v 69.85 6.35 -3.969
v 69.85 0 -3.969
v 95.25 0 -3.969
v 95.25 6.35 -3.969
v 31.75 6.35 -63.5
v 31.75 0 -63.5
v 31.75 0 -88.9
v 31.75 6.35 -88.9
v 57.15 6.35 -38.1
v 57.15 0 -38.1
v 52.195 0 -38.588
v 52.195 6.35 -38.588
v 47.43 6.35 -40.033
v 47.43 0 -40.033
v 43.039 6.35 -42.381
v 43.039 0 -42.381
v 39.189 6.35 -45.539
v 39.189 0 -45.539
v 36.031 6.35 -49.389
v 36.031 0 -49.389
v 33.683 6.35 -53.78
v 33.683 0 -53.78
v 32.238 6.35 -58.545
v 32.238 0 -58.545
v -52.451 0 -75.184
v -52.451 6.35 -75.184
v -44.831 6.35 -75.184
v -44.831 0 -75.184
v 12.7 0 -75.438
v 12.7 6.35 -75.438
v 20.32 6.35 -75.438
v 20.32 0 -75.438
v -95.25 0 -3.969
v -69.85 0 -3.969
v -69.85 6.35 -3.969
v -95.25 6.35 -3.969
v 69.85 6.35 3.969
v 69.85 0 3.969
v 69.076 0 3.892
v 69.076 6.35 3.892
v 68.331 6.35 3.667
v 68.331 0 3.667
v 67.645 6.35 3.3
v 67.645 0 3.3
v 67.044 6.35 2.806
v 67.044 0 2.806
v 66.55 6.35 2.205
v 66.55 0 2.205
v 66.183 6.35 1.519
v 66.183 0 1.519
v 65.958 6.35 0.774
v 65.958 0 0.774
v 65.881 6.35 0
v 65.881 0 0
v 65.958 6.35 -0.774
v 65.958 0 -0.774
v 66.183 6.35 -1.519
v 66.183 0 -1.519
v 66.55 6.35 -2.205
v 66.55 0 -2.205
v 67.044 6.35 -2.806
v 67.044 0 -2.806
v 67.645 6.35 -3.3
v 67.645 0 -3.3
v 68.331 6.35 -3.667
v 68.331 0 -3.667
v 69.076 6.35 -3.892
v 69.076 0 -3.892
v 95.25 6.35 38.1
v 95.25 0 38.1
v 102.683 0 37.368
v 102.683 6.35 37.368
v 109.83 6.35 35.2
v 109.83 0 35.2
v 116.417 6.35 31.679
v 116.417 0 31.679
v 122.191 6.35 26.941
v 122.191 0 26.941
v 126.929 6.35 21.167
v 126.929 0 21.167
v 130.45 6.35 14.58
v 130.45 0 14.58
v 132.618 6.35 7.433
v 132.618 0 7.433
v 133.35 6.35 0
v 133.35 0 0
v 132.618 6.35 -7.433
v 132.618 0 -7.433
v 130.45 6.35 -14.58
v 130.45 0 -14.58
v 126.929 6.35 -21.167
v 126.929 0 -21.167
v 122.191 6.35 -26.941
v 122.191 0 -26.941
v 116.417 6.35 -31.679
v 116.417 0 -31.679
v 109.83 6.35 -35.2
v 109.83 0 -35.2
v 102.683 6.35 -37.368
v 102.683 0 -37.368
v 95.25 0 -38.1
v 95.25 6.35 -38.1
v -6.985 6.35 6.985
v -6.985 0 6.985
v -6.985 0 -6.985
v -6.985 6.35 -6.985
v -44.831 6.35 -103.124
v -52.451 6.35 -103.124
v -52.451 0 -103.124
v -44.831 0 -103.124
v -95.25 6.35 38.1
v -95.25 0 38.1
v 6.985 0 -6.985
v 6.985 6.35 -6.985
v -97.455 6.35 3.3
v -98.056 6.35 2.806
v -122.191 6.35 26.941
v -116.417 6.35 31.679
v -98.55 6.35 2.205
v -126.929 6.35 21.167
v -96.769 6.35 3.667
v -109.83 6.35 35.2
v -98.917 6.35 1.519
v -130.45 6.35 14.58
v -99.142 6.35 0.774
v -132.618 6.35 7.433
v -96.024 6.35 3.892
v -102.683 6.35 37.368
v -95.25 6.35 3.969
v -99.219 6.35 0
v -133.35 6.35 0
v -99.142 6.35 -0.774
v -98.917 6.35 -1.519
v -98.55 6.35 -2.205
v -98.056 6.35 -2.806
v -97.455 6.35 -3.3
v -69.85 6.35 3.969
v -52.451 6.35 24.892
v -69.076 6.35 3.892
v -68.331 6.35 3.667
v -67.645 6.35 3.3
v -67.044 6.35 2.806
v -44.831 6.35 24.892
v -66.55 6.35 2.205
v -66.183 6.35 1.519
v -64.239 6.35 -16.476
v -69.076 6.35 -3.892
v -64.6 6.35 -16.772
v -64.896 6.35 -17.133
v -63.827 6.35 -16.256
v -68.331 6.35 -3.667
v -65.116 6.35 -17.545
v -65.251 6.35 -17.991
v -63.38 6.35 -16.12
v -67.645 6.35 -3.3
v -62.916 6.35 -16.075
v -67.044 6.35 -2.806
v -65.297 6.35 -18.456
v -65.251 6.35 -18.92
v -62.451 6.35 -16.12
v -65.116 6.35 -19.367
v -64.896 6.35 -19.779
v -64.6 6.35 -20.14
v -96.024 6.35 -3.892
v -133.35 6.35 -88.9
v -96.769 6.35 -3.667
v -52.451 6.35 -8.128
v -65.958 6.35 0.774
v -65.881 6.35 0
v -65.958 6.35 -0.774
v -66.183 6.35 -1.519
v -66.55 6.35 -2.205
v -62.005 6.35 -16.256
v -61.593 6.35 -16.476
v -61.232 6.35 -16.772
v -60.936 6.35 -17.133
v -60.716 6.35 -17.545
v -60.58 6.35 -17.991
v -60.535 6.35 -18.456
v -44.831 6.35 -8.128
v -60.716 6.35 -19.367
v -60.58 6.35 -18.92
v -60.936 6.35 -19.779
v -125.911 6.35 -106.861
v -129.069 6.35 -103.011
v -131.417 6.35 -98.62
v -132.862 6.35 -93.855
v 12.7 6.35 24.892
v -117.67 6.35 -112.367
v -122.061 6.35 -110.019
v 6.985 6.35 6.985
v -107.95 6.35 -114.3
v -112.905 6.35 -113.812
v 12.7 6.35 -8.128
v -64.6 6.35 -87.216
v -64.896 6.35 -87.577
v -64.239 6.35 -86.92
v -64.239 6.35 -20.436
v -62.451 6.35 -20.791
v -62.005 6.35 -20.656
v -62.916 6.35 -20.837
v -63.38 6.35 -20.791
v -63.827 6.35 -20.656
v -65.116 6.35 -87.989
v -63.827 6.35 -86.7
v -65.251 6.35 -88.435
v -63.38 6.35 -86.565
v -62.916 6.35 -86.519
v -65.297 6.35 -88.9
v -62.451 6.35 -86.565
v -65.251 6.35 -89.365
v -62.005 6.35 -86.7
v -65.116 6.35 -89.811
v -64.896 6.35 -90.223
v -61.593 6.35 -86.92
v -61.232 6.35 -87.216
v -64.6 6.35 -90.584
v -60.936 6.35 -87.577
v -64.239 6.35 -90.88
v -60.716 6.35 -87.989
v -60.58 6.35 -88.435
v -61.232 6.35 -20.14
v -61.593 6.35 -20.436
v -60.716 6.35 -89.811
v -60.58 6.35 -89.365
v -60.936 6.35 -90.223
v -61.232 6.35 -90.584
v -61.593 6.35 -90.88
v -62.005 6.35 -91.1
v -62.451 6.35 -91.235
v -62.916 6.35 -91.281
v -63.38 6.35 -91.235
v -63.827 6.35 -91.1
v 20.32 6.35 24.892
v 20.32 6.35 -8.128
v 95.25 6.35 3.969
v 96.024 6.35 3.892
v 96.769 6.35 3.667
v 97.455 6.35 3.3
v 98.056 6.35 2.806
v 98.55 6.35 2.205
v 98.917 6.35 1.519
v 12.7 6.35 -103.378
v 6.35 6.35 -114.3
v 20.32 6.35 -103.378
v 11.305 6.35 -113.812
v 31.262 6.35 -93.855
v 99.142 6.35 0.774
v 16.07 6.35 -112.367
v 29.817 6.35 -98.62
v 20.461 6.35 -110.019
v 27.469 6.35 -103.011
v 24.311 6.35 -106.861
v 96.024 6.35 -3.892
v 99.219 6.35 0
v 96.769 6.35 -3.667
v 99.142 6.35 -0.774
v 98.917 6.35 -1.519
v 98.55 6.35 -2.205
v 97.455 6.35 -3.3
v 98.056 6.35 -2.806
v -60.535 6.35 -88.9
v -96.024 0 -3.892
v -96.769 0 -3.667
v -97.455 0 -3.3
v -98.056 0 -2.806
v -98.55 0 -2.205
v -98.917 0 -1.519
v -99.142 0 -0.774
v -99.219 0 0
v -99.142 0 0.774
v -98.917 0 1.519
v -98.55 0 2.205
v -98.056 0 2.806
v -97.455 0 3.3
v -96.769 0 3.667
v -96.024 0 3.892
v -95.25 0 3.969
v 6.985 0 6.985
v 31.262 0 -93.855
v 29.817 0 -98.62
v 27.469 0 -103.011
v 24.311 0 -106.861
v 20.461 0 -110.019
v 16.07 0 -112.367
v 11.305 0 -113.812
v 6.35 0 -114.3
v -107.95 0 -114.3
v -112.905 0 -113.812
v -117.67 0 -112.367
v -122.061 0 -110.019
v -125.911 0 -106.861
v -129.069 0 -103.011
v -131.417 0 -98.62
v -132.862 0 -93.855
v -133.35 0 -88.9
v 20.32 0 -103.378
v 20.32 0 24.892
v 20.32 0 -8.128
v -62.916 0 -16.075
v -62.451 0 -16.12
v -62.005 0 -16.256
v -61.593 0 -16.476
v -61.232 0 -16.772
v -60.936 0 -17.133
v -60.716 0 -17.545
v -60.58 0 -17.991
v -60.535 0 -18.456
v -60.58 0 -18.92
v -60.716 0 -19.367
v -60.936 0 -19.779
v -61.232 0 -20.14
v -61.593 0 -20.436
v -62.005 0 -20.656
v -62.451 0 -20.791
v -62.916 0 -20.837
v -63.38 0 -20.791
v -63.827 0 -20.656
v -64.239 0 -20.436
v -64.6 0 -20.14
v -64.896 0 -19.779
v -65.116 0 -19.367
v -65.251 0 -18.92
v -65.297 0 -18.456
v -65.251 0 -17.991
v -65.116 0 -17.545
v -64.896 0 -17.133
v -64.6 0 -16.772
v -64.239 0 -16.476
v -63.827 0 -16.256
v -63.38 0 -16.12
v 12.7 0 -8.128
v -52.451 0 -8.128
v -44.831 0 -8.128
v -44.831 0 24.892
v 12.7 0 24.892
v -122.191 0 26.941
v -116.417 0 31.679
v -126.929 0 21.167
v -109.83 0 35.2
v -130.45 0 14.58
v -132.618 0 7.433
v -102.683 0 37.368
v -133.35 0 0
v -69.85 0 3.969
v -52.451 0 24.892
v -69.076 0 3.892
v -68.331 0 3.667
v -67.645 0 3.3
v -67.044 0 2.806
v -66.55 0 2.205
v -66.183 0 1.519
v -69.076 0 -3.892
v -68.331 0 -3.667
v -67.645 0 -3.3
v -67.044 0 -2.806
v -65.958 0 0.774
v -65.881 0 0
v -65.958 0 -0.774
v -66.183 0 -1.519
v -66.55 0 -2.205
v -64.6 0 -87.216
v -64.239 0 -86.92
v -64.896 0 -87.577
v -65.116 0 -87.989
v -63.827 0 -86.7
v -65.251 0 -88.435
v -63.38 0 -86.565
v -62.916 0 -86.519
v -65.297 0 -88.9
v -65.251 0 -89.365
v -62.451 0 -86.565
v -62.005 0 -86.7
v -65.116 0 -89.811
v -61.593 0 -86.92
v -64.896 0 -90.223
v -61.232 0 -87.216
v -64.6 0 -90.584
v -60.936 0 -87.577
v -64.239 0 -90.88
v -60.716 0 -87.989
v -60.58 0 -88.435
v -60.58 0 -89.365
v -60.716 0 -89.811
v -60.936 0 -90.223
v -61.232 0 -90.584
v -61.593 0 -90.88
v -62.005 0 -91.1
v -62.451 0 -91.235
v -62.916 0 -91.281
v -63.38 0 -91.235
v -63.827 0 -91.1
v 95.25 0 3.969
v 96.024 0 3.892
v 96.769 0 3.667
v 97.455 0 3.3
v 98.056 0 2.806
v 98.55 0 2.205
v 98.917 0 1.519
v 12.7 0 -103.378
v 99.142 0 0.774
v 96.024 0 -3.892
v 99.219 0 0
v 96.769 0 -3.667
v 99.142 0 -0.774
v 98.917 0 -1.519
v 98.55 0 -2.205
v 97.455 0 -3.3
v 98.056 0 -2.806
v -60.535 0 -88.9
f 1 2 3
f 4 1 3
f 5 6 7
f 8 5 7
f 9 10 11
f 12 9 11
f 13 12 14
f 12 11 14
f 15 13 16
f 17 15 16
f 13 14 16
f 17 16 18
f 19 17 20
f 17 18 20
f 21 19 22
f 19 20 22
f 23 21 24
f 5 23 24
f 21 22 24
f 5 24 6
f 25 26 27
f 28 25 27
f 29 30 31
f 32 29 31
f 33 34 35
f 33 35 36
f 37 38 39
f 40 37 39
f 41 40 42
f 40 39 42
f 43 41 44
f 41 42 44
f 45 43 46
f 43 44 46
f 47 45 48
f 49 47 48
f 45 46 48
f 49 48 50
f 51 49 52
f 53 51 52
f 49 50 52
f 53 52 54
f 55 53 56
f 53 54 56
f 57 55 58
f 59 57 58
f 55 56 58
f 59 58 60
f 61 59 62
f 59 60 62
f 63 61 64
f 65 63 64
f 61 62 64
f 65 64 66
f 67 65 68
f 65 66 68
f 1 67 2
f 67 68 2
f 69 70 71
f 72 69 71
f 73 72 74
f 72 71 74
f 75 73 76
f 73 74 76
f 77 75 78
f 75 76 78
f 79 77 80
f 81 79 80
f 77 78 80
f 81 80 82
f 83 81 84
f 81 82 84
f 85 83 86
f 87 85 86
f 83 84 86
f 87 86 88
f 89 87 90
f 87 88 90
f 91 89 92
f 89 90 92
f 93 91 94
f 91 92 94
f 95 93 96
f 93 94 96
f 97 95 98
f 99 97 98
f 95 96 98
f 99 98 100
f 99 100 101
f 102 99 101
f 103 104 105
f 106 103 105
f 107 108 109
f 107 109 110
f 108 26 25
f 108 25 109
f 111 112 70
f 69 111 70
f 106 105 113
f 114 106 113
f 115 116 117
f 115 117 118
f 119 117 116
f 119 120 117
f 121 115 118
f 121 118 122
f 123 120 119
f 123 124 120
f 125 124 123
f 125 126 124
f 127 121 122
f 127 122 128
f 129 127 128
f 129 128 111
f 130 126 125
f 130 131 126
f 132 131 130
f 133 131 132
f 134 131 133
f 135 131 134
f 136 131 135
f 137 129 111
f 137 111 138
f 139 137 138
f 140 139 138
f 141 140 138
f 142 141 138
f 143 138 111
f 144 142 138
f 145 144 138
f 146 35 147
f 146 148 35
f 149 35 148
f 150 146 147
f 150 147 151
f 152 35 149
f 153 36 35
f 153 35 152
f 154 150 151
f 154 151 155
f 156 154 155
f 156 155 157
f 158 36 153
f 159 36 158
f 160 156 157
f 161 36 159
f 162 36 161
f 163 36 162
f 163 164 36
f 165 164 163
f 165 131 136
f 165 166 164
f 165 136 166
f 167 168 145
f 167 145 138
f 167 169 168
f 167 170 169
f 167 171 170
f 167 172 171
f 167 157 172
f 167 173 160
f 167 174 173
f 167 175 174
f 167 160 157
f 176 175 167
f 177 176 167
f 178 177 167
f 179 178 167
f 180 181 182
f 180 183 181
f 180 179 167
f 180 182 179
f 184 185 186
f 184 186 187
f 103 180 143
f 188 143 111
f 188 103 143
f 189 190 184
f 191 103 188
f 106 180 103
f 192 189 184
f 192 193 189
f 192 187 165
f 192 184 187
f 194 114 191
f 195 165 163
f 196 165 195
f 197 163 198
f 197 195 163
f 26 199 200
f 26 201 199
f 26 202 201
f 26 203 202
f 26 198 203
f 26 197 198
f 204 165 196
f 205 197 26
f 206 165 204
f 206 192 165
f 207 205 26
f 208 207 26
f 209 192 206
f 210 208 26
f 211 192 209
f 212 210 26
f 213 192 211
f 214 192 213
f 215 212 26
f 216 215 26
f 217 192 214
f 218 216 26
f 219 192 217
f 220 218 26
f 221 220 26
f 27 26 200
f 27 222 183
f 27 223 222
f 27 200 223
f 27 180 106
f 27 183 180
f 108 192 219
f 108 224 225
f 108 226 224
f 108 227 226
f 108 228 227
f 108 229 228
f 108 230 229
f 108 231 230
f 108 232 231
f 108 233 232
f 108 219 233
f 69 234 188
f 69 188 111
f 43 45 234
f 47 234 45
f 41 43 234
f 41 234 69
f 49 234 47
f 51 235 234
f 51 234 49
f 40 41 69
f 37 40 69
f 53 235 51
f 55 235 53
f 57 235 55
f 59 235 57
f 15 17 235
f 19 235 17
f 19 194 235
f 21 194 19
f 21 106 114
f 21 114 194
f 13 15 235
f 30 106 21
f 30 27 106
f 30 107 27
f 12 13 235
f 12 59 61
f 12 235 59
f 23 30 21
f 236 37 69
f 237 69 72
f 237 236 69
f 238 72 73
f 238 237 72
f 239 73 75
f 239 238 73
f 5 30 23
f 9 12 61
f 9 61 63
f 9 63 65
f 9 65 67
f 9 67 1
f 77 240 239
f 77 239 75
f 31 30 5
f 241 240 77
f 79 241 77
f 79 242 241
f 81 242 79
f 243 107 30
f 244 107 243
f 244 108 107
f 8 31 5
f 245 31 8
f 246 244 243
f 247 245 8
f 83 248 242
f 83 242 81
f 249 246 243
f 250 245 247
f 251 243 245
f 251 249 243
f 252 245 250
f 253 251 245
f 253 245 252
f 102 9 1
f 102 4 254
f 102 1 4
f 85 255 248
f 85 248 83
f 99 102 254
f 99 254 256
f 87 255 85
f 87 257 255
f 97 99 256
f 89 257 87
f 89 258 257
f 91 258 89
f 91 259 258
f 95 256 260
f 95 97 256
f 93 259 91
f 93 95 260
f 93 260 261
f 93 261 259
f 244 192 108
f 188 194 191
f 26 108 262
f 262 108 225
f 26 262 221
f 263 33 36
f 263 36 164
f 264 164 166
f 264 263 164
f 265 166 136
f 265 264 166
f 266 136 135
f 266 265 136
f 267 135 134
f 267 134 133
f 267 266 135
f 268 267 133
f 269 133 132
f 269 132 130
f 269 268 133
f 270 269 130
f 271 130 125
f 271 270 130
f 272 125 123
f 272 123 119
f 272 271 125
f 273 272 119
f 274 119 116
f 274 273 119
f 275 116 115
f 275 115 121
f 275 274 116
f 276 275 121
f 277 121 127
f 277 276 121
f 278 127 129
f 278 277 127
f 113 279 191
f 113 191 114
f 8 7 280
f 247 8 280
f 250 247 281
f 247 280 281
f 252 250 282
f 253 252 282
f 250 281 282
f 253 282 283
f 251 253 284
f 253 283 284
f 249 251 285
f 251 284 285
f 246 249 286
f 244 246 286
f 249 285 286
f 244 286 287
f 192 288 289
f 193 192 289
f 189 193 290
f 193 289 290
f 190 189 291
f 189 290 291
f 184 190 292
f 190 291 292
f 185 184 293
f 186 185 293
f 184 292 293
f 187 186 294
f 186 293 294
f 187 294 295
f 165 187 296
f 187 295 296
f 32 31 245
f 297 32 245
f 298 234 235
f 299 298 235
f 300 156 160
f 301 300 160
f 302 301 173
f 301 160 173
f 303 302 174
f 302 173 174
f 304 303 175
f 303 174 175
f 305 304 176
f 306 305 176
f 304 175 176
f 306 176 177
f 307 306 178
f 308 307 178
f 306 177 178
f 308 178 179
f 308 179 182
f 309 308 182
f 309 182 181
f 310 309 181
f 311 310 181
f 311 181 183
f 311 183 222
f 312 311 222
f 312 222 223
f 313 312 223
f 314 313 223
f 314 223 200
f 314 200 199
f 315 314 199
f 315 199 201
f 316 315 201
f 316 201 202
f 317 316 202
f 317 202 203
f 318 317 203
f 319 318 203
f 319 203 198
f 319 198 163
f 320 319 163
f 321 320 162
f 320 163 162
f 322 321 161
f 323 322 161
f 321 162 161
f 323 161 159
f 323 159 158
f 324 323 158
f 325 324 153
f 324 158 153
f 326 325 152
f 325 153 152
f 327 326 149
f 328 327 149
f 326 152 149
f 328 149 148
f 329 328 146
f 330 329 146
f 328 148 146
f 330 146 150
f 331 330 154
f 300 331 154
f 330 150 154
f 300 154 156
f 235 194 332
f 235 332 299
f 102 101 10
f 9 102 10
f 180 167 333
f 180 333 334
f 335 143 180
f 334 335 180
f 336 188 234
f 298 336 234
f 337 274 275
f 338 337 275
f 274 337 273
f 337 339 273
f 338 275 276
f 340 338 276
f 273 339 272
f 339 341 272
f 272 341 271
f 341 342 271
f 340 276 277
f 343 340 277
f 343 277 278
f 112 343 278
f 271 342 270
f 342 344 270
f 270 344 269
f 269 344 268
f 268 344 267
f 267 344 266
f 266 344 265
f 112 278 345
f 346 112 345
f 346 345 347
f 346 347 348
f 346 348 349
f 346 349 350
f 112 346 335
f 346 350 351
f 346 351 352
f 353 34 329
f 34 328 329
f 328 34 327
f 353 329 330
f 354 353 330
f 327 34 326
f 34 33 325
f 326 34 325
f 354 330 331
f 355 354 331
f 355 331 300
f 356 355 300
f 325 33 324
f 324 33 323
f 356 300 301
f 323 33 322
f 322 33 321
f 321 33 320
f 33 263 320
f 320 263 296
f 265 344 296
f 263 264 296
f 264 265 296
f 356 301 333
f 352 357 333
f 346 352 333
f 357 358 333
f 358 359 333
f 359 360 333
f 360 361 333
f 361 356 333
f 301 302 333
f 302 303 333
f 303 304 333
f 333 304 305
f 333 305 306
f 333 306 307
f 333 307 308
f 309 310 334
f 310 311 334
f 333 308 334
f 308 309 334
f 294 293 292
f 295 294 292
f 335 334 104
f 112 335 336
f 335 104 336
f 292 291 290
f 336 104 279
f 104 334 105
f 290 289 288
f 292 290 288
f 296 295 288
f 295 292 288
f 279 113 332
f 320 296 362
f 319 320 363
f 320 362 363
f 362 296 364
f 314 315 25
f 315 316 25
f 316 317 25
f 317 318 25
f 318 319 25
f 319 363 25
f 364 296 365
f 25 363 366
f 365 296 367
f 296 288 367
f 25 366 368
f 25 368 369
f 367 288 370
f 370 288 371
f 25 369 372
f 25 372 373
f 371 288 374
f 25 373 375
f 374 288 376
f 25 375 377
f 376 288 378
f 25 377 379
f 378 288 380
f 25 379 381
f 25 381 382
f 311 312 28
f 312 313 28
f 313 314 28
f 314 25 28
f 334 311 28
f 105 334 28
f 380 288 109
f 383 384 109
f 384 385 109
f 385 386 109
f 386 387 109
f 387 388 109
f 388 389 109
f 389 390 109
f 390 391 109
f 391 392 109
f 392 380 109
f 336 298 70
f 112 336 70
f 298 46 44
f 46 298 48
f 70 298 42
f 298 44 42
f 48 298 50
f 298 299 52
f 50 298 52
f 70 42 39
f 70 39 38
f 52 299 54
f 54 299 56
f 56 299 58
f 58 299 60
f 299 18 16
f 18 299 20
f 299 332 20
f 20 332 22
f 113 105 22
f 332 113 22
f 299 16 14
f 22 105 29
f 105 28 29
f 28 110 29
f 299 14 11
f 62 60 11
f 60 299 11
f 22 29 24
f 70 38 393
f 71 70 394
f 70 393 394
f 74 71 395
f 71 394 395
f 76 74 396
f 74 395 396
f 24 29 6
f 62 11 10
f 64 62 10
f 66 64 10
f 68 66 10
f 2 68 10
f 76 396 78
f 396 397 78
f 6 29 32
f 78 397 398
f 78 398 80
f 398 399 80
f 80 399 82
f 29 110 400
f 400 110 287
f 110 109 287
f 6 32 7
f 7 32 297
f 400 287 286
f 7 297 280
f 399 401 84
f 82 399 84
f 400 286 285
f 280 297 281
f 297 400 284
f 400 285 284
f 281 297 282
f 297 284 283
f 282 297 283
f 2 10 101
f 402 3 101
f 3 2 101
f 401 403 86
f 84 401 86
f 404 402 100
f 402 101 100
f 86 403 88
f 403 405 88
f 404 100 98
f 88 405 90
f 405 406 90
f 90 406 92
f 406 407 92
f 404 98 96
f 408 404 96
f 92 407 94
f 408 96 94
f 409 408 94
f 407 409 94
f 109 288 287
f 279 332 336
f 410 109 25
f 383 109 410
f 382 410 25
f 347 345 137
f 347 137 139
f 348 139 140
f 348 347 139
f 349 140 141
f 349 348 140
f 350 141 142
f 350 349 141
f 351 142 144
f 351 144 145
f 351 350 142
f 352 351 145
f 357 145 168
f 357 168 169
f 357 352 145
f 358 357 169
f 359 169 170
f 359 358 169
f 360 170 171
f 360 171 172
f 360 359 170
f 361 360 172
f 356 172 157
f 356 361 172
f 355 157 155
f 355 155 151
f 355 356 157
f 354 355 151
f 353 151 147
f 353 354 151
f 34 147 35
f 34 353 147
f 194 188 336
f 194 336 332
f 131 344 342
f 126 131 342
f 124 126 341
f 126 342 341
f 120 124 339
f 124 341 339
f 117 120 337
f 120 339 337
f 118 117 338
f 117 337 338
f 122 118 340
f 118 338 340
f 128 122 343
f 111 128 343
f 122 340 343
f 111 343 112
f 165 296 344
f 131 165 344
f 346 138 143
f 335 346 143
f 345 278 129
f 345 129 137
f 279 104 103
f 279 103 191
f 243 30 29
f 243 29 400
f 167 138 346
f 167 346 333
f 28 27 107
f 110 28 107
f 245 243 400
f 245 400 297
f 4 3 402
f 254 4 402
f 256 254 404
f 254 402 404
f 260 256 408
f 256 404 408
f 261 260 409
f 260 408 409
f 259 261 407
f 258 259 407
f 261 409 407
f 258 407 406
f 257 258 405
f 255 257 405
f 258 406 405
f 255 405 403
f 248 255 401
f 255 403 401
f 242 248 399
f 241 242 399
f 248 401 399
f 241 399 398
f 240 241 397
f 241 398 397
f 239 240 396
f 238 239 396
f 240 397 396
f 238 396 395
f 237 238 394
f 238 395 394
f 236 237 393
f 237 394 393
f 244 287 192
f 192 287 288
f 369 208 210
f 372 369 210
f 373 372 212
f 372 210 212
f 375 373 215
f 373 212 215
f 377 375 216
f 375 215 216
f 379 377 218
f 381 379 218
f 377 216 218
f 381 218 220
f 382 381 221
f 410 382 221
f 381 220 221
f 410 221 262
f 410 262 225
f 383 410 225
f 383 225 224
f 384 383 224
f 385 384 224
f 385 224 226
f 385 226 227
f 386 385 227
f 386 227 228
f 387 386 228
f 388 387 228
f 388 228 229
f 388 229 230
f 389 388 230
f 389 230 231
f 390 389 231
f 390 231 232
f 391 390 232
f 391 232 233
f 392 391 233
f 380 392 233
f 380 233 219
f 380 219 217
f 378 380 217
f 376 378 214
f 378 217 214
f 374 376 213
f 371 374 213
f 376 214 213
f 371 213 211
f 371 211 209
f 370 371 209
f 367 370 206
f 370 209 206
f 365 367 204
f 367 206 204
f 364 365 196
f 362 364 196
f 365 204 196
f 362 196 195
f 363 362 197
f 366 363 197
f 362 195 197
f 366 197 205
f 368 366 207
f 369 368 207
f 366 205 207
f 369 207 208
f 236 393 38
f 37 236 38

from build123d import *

# Parameters (mm, degrees)
SKETCH1_W           = 13.97
SKETCH1_H           = 13.97
BOSS_EXTRUDE1_DEPTH = 6.35
SKETCH4_W           = 7.62
SKETCH4_H           = 33.02
SKETCH4_H_2         = 27.94
CUT_EXTRUDE1_DEPTH  = 176.747076789
SKETCH5_R           = 2.38125
CUT_EXTRUDE2_DEPTH  = 176.747076789


with BuildPart() as part:
    # Sketch1 → Boss-Extrude1 (new body)
    with BuildSketch(Plane(origin=(0, 0, 0), x_dir=(1, 0, 0), z_dir=(0, 1, 0))):
        with BuildLine():
            Line((-95.25, -38.1), (95.25, -38.1))
            ThreePointArc((95.25, -38.1), (133.35, 0), (95.25, 38.1))
            Line((95.25, 38.1), (57.15, 38.1))
            ThreePointArc((57.15, 38.1), (39.189487758, 45.539487758), (31.75, 63.5))
            Line((31.75, 63.5), (31.75, 88.9))
            ThreePointArc((31.75, 88.9), (24.310512242, 106.860512242), (6.35, 114.3))
            Line((6.35, 114.3), (-107.95, 114.3))
            ThreePointArc((-107.95, 114.3), (-125.910512242, 106.860512242), (-133.35, 88.9))
            Line((-133.35, 88.9), (-133.35, 0))
            ThreePointArc((-133.35, 0), (-122.190768363, -26.940768363), (-95.25, -38.1))
        make_face()
        Rectangle(SKETCH1_W, SKETCH1_H, mode=Mode.SUBTRACT)
        with BuildLine():
            Line((95.25, -3.96875), (69.85, -3.96875))
            ThreePointArc((69.85, -3.96875), (65.88125, 0), (69.85, 3.96875))
            Line((69.85, 3.96875), (95.25, 3.96875))
            ThreePointArc((95.25, 3.96875), (99.21875, 0), (95.25, -3.96875))
        make_face(mode=Mode.SUBTRACT)
        with BuildLine():
            Line((-95.25, -3.96875), (-69.85, -3.96875))
            ThreePointArc((-69.85, -3.96875), (-65.88125, 0), (-69.85, 3.96875))
            Line((-69.85, 3.96875), (-95.25, 3.96875))
            ThreePointArc((-95.25, 3.96875), (-99.21875, 0), (-95.25, -3.96875))
        make_face(mode=Mode.SUBTRACT)
    extrude(amount=BOSS_EXTRUDE1_DEPTH)

    # Sketch4 → Cut-Extrude1 (cut, through all)
    with BuildSketch(Plane(origin=(0, 6.35, 0), x_dir=(1, 0, 0), z_dir=(0, 1, 0))):
        with Locations((16.51, -8.382)):
            Rectangle(SKETCH4_W, SKETCH4_H)
        with Locations((-48.641, -8.382)):
            Rectangle(SKETCH4_W, SKETCH4_H)
        with Locations((16.51, 89.408)):
            Rectangle(SKETCH4_W, SKETCH4_H_2)
        with Locations((-48.641, 89.154)):
            Rectangle(SKETCH4_W, SKETCH4_H_2)
    extrude(amount=-CUT_EXTRUDE1_DEPTH, mode=Mode.SUBTRACT)

    # Sketch5 → Cut-Extrude2 (cut, through all)
    with BuildSketch(Plane(origin=(0, 6.35, 0), x_dir=(1, 0, 0), z_dir=(0, 1, 0))):
        with Locations(Location((-62.9158, 88.9, 0), (0, 0, 270))):
            Circle(SKETCH5_R)
        with Locations(Location((-62.9158, 18.455847939, 0), (0, 0, 270))):
            Circle(SKETCH5_R)
    extrude(amount=-CUT_EXTRUDE2_DEPTH, mode=Mode.SUBTRACT)


solid = part.part
